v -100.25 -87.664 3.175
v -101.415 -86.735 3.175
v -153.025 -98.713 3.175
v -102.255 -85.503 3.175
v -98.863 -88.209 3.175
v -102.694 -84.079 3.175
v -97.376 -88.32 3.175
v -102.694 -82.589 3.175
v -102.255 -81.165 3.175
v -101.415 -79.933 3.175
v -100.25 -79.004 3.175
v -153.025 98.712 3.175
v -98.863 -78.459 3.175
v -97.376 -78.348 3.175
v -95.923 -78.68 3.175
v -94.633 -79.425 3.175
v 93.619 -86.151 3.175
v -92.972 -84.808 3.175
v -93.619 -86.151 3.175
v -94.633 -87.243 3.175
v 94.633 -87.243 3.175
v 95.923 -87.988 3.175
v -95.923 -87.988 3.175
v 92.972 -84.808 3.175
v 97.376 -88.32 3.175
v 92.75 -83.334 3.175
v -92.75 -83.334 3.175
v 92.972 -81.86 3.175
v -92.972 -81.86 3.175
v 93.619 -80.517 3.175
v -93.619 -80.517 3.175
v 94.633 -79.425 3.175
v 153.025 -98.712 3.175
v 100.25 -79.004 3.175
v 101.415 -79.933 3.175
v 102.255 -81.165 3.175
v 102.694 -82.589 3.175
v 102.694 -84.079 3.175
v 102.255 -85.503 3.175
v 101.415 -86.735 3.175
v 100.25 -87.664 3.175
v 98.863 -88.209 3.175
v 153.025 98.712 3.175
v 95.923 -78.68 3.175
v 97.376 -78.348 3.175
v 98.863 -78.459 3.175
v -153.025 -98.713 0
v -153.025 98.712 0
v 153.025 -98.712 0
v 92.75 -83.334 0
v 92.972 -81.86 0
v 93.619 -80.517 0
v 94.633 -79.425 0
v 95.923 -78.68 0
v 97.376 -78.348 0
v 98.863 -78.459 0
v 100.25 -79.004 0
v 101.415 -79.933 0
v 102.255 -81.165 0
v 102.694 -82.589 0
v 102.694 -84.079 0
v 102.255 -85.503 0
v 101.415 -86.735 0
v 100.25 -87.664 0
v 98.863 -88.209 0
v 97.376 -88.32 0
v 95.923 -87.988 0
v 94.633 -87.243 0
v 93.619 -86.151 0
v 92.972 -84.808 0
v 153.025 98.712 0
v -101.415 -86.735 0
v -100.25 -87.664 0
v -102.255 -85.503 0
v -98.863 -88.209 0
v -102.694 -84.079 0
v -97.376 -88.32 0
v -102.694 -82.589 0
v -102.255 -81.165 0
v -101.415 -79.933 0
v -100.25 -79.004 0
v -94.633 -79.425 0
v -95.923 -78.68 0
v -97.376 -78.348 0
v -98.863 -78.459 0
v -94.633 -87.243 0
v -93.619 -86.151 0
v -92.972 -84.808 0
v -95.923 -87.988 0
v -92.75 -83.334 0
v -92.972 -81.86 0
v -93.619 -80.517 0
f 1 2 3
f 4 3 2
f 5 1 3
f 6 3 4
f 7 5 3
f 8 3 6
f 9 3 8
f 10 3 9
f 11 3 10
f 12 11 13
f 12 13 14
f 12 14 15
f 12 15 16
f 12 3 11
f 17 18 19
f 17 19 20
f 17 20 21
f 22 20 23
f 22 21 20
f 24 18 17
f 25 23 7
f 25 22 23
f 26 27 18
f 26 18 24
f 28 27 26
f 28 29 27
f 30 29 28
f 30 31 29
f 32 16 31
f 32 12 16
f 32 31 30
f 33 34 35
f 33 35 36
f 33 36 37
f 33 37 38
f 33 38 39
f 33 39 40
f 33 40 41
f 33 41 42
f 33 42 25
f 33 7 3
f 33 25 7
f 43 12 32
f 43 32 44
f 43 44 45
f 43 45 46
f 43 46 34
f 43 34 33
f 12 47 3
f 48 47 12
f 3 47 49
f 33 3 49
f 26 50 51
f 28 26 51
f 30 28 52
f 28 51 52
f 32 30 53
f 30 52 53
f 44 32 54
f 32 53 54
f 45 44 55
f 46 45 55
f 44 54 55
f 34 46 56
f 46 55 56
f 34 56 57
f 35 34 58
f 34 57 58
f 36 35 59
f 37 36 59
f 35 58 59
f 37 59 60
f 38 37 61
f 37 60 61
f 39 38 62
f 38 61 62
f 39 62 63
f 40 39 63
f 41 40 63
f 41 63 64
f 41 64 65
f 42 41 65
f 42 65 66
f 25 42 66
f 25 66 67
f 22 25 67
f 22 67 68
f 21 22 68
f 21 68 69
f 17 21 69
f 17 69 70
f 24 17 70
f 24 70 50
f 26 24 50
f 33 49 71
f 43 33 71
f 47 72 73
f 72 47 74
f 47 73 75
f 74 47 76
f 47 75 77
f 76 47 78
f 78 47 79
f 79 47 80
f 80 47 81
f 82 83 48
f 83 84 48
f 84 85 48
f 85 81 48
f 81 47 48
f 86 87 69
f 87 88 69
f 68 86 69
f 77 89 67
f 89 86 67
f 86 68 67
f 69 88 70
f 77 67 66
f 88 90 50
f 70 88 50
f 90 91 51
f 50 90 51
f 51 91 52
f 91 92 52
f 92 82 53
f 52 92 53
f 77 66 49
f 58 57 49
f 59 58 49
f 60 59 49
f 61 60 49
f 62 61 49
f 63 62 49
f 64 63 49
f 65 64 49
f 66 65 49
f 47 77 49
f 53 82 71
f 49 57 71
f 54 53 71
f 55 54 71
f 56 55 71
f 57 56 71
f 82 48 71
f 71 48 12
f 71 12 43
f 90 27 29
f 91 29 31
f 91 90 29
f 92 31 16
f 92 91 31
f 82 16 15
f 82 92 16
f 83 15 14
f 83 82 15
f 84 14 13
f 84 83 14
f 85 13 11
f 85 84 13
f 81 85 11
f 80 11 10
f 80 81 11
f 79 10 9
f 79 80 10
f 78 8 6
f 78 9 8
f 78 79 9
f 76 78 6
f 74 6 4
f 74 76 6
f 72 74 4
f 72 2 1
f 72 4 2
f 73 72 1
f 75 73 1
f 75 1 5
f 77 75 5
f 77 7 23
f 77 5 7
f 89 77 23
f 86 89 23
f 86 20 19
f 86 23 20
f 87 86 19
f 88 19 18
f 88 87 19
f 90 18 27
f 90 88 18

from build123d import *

# Parameters (mm, degrees)
SKETCH1_W           = 306.05
SKETCH1_H           = 197.425
SKETCH1_R           = 10.775
BOSS_EXTRUDE1_DEPTH = 3.175
SKETCH2_R           = 5
CUT_EXTRUDE1_DEPTH  = 183.128770122


with BuildPart() as part:
    # Sketch1 → Boss-Extrude1 (new body)
    # profile 1 of 5: a face of its own
    with BuildSketch(Plane.XY):
        Rectangle(SKETCH1_W, SKETCH1_H)
        with Locations((-142.25, -87.9375)):
            Circle(SKETCH1_R, mode=Mode.SUBTRACT)
        with Locations((-130.25, -64.9375)):
            Circle(SKETCH1_R, mode=Mode.SUBTRACT)
    # profile 2 of 5: a face of its own
    with BuildSketch(Plane.XY):
        with Locations((-130.25, -64.9375)):
            Circle(SKETCH1_R)
    # profile 3 of 5: a face of its own
    with BuildSketch(Plane.XY):
        with Locations((-142.25, -87.9375)):
            Circle(SKETCH1_R)
    # profile 4 of 5: a face of its own
    with BuildSketch(Plane.XY):
        with BuildLine():
            ThreePointArc((-142.25, -98.7125), (-149.869075567, -95.556575567), (-153.025, -87.9375))
            Line((-153.025, -87.9375), (-153.025, -98.7125))
            Line((-153.025, -98.7125), (-142.25, -98.7125))
        make_face()
    # profile 5 of 5: a face of its own
    with BuildSketch(Plane.XY):
        Rectangle(SKETCH1_W, SKETCH1_H)
    extrude(amount=BOSS_EXTRUDE1_DEPTH)

    # Sketch2 → Cut-Extrude1 (cut, through all)
    with BuildSketch(Plane(origin=(0, 0, 0), x_dir=(-1, 0, 0), z_dir=(0, 0, -1))):
        with Locations((-97.75, -83.334)):
            Circle(SKETCH2_R)
    cut_extrude1 = extrude(amount=-CUT_EXTRUDE1_DEPTH, mode=Mode.SUBTRACT)

    # Mirror1: Cut-Extrude1 across plane
    add(cut_extrude1.mirror(Plane(origin=(0, 0, 0), x_dir=(0, 0, 1), z_dir=(1, 0, 0))), mode=Mode.SUBTRACT)


solid = part.part
